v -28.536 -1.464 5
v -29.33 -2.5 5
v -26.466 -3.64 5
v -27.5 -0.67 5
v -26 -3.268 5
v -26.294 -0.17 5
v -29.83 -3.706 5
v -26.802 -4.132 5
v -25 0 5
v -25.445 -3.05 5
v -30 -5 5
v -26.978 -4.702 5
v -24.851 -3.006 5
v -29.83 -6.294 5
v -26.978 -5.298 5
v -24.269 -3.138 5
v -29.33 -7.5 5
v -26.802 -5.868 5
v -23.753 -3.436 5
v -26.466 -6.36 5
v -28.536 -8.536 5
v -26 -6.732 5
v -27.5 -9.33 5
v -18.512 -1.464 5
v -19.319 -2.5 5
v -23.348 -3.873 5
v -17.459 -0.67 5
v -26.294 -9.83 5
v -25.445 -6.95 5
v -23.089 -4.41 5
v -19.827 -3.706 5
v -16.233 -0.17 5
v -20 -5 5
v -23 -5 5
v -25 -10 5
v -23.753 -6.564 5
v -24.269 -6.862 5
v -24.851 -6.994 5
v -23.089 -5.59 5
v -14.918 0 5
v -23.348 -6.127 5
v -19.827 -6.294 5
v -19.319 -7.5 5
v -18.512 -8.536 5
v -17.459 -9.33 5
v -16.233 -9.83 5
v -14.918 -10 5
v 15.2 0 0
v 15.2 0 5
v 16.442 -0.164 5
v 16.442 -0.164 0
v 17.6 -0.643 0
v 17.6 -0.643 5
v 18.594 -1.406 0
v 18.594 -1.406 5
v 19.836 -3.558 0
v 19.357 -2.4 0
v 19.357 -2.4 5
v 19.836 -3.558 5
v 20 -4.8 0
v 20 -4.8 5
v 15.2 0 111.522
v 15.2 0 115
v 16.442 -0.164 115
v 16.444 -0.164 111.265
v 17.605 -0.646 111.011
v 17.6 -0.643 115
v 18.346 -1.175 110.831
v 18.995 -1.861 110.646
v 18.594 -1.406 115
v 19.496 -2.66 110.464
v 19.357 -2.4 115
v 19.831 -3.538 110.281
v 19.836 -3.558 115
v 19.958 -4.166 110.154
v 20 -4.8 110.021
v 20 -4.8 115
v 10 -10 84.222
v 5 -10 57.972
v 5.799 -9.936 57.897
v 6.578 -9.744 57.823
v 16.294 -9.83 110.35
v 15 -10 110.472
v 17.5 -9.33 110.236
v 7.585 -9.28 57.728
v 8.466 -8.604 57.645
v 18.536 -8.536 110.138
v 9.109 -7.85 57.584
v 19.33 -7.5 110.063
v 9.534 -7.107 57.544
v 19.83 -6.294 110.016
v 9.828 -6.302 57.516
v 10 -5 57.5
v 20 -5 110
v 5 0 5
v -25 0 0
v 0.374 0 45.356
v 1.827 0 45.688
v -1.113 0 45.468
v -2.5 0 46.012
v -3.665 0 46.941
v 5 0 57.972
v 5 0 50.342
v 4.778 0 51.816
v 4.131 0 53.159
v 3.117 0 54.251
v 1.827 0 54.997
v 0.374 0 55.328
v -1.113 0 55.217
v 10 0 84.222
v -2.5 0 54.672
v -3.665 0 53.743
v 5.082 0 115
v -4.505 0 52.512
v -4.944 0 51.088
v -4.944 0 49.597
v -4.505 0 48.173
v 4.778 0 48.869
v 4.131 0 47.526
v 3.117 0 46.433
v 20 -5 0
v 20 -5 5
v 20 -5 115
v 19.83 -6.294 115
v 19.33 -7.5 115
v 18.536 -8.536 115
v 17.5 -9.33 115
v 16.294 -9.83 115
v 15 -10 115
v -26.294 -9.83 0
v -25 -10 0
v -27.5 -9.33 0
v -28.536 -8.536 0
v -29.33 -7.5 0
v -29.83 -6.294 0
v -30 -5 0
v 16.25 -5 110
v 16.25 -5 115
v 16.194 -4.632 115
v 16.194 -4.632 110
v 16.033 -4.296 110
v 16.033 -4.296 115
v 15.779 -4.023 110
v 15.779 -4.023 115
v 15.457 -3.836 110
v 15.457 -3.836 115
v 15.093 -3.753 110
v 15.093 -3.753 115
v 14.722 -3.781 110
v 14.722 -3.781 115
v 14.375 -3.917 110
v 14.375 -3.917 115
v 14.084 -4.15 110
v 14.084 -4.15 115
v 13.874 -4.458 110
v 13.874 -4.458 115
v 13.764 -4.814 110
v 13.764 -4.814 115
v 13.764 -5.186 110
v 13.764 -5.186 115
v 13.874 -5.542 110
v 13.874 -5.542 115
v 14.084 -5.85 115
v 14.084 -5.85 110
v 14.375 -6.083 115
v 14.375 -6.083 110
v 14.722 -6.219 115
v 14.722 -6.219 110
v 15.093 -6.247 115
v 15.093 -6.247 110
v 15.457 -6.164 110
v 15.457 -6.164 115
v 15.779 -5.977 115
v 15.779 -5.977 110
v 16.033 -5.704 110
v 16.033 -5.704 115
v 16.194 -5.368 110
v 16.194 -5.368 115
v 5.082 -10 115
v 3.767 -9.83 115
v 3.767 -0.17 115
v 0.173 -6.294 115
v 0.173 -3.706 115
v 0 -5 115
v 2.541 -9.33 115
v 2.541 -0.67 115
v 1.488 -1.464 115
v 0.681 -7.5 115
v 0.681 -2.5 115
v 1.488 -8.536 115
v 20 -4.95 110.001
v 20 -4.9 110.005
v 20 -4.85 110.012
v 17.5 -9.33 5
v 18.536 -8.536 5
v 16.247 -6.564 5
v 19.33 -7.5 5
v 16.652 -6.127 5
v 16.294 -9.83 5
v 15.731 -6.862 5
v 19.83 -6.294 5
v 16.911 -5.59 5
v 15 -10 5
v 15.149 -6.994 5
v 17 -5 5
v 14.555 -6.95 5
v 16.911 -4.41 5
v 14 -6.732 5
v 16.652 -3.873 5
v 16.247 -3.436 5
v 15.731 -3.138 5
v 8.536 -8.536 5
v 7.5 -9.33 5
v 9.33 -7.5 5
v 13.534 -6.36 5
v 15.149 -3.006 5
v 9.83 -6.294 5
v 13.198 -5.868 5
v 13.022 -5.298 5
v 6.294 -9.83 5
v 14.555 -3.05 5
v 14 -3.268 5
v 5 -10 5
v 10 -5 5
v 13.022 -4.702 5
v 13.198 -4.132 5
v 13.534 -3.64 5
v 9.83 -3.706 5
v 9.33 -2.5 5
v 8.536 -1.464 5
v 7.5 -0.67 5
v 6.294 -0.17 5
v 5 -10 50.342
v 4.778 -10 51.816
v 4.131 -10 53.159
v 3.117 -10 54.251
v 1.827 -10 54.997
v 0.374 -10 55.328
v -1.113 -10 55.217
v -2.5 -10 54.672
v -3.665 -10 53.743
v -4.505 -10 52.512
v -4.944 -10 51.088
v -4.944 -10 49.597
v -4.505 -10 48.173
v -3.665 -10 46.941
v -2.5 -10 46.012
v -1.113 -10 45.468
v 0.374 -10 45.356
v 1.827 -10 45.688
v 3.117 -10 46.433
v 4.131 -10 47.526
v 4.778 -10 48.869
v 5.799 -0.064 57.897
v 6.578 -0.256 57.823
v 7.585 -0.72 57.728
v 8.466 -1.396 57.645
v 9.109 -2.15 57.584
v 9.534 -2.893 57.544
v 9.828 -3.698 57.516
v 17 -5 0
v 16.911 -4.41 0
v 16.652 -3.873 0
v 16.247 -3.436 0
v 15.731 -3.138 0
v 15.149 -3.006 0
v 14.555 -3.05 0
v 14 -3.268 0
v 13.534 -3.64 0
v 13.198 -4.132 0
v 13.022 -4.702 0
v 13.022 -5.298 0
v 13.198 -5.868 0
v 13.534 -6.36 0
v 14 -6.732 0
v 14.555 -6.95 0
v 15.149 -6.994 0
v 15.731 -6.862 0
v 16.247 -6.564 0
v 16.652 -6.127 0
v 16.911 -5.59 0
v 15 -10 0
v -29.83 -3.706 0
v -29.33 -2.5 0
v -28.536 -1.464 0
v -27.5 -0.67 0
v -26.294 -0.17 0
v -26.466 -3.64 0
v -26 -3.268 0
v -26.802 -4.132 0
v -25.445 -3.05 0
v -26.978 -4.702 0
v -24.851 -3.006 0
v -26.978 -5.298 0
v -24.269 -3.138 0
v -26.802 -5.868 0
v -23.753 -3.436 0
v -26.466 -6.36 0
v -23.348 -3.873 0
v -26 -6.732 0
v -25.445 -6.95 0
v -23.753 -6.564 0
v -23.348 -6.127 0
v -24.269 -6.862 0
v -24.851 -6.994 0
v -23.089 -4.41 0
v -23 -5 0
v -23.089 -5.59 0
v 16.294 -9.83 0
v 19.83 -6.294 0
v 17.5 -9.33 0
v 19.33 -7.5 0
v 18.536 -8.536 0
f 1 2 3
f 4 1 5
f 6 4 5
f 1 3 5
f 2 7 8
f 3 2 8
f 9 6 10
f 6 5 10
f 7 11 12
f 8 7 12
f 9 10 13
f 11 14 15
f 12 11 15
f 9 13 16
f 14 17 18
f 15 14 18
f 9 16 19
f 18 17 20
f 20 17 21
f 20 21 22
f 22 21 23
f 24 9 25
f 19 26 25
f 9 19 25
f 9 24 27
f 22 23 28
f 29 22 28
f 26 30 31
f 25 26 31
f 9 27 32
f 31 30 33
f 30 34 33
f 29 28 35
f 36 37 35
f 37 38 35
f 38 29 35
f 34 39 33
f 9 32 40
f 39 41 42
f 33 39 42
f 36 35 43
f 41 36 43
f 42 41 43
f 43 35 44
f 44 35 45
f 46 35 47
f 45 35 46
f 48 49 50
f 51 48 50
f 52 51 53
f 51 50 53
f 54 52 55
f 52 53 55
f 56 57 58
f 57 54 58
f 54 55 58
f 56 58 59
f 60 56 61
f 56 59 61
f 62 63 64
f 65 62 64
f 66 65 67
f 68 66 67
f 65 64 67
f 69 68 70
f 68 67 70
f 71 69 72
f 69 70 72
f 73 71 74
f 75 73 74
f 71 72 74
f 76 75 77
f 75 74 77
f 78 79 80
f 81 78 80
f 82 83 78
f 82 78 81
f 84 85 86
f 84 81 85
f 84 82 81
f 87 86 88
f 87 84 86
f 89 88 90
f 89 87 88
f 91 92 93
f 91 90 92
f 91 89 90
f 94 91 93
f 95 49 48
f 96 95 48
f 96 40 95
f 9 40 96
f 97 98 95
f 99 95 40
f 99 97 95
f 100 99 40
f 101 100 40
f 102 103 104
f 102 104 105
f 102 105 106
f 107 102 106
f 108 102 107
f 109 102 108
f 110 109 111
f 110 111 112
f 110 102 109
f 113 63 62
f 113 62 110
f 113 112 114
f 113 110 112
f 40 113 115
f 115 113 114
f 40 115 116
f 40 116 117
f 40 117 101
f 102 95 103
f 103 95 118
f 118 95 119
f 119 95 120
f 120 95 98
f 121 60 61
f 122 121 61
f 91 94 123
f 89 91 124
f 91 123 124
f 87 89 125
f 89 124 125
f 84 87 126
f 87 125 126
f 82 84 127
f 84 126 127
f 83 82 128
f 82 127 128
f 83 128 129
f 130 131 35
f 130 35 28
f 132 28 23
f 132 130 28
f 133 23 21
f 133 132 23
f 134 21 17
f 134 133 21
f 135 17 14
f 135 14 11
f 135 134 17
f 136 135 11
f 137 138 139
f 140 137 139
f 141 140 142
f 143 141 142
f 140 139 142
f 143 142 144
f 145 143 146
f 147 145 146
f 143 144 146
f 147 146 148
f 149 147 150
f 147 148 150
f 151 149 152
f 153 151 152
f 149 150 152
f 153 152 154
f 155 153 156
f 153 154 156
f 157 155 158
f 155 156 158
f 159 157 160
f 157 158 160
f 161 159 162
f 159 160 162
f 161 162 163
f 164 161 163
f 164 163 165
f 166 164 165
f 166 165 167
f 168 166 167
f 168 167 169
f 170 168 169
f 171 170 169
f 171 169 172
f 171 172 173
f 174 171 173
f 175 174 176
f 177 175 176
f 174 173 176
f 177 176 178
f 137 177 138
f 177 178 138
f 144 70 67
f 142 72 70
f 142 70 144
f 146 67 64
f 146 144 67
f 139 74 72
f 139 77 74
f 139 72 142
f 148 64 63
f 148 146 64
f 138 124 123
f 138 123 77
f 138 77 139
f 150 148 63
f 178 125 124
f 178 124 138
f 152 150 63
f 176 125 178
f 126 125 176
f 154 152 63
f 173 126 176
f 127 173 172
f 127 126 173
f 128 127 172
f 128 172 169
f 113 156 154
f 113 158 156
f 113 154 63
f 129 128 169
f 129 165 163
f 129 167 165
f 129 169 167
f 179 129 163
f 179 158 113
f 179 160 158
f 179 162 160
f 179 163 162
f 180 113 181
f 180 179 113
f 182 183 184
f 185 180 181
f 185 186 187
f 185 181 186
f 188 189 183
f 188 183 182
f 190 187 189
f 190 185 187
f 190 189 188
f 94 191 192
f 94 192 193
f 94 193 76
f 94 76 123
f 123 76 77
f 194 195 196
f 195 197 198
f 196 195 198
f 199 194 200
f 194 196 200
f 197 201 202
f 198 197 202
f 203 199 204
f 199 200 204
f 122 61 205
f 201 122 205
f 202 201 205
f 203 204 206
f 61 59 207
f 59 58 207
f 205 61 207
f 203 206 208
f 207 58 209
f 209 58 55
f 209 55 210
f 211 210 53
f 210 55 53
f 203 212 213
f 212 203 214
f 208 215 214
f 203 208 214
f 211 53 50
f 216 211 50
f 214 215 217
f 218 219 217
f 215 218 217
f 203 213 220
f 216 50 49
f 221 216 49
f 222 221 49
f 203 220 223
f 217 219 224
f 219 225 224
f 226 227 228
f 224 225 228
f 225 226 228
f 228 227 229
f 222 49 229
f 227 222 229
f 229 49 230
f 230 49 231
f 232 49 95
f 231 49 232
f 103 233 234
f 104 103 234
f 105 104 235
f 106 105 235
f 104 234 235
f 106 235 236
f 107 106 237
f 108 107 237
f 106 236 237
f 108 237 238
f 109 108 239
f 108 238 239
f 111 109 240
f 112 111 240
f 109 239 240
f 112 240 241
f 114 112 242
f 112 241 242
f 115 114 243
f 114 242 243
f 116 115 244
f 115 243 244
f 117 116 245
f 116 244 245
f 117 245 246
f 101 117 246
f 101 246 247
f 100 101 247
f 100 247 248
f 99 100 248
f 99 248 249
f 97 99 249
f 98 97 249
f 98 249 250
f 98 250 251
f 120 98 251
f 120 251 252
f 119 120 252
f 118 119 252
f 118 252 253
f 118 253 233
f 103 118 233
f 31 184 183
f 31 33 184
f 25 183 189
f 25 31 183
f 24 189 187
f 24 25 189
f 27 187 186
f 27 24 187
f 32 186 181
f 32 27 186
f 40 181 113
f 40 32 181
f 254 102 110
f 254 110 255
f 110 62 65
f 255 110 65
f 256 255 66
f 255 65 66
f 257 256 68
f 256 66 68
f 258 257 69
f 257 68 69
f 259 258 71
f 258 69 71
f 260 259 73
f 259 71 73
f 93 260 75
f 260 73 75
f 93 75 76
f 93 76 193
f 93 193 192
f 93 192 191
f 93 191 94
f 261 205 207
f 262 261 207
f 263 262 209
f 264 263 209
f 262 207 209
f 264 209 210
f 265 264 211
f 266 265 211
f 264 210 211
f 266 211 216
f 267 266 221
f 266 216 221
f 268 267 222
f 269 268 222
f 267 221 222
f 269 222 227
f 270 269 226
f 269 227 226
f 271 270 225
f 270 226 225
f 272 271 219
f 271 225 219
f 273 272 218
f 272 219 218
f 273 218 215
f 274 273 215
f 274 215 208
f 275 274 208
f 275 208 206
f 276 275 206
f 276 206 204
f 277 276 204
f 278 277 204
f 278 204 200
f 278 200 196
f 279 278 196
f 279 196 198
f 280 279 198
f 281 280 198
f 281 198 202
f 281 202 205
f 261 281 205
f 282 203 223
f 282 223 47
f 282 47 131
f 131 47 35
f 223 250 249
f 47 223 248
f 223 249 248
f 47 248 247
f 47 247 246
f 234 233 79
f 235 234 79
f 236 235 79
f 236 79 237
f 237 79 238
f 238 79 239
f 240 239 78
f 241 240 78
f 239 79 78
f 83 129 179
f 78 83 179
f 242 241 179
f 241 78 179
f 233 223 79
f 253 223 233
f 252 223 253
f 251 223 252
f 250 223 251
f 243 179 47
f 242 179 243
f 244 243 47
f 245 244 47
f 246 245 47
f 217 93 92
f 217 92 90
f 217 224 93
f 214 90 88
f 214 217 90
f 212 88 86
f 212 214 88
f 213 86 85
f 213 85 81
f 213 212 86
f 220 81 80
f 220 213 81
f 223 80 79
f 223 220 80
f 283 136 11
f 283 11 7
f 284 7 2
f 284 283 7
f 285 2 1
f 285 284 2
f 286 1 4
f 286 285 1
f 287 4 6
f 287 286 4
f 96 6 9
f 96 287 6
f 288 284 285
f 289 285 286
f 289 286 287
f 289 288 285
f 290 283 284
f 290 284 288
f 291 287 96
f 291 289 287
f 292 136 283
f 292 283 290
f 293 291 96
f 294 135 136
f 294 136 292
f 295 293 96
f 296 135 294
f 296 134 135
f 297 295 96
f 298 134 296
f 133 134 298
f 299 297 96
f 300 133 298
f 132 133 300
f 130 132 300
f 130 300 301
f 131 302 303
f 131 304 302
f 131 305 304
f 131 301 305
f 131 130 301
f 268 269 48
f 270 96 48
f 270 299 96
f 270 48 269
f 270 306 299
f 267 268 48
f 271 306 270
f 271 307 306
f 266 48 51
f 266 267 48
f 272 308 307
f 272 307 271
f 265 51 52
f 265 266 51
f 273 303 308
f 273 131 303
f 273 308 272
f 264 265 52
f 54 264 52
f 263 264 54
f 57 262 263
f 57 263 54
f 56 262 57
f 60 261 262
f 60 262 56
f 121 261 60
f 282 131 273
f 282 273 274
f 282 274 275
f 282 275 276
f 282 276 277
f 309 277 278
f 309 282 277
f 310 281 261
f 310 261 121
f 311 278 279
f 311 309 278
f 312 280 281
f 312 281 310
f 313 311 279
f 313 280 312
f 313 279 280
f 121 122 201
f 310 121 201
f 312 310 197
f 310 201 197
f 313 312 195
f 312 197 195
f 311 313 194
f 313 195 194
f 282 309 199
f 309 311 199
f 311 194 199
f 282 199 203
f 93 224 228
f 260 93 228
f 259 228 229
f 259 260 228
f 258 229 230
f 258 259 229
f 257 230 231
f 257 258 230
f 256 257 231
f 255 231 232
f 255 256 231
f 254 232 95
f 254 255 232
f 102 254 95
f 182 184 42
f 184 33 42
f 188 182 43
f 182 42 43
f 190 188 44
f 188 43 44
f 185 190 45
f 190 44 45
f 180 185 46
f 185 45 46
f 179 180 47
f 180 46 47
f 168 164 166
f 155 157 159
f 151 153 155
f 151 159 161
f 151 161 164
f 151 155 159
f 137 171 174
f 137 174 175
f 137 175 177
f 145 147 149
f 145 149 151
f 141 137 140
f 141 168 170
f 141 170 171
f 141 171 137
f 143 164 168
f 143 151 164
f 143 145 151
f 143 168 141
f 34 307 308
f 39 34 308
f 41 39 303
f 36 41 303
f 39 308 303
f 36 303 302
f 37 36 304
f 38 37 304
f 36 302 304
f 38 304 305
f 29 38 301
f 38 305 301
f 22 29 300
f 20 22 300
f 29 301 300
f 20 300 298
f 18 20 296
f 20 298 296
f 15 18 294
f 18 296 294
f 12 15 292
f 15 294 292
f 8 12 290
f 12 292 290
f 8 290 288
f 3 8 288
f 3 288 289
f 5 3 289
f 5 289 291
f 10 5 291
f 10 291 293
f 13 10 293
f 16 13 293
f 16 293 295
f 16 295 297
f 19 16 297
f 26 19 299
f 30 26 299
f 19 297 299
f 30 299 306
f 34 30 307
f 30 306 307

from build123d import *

# Parameters (mm, degrees)
F1_DEPTH     = 10
F2_R         = 2
F3_DEPTH     = 115.001
F4_R         = 2
F4_R_2       = 1.25
F5_DEPTH     = 5
F6_R         = 2
F7_DEPTH     = 5
F9_DEPTH     = 10
F10_R        = 4.99999
F11_R        = 5
F12_DEPTH    = 10.001
F14_DEPTH    = 10
F15_T4_DEPTH = 78.4438958161
F15_T9_DEPTH = 78.4438958161
F16_R        = 4.99999


# Not quite as in the source:
# - a fillet or chamfer that OpenCascade refuses, or shapes differently, is made with other operations: its cross-section is extruded or revolved along the edge and cut away or added
# - a fillet or chamfer is up to 0.001 mm smaller than in the source, because OpenCascade refuses the exact size


with BuildPart() as f1:
    # F0 (on Front) → F1 (new body)
    with BuildSketch(Plane.XZ):
        Polygon((0, 115), (0, 0), (10, 0), (20, 0), (20, 5), (10, 5), (10, 110), (20, 110), (20, 115), (10, 115), align=None)
    extrude(amount=F1_DEPTH)

    # F2 (on face) → F3 (cut, through all)
    with BuildSketch(Plane.XY.offset(115)):
        with BuildLine():
            Line((0, -10), (5, -10))
            ThreePointArc((5, -10), (1.4644660941, -8.5355339059), (0, -5))
            Line((0, -5), (0, -10))
        make_face()
        with BuildLine():
            Line((0, 0), (0, -5))
            ThreePointArc((0, -5), (1.4644660941, -1.4644660941), (5, 0))
            Line((5, 0), (0, 0))
        make_face()
        with BuildLine():
            ThreePointArc((15.2, 0), (18.5941125497, -1.4058874503), (20, -4.8))
            Line((20, -4.8), (20, 0))
            Line((20, 0), (15.2, 0))
        make_face()
        with BuildLine():
            ThreePointArc((20, -5), (18.5355339059, -8.5355339059), (15, -10))
            Line((15, -10), (20, -10))
            Line((20, -10), (20, -5))
        make_face()
        with Locations((15, -5)):
            Circle(F2_R)
    extrude(amount=-F3_DEPTH, mode=Mode.SUBTRACT)

    # F4 (on face) → F5 (join)
    with BuildSketch(Plane.XY.offset(115)):
        with Locations((15, -5)):
            Circle(F4_R)
        with Locations((15, -5)):
            Circle(F4_R_2, mode=Mode.SUBTRACT)
    extrude(amount=-F5_DEPTH)

    # F6 (on face) → F7 (join)
    with BuildSketch(Plane(origin=(0, 0, 0), x_dir=(1, 0, 0), z_dir=(0, 0, -1))):
        with BuildLine():
            Line((-25, 0), (5, 0))
            ThreePointArc((5, 0), (0, 5), (5, 10))
            Line((5, 10), (-25, 10))
            ThreePointArc((-25, 10), (-28.5355339059, 8.5355339059), (-30, 5))
            ThreePointArc((-30, 5), (-28.5355339059, 1.4644660941), (-25, 0))
        make_face()
        with Locations((-25, 5)):
            Circle(F6_R, mode=Mode.SUBTRACT)
    extrude(amount=-F7_DEPTH)

    # F8 (on face) → F9 (join)
    with BuildSketch(Plane.XZ.offset(10)):
        Polygon((0, 115), (-20, 5), (5, 5), (5, 115), align=None)
    extrude(amount=-F9_DEPTH)

    # F10 (radius 5 in the source; OpenCascade refuses exactly that, so slightly less here)
    f10_edges = [f1.edges().sort_by_distance(p)[0] for p in [
        (-10, 0, 60),
        (-10, -10, 60),
    ]]
    fillet(f10_edges, radius=F10_R)

    # F11 (on face) → F12 (cut, through all)
    with BuildSketch(Plane.XZ.offset(10)):
        with Locations((0, 50.3422953188)):
            Circle(F11_R)
    extrude(amount=-F12_DEPTH, mode=Mode.SUBTRACT)

    # F13 (on face) → F14 (join)
    with BuildSketch(Plane(origin=(0, 0, 0), x_dir=(-1, 0, 0), z_dir=(0, 1, 0))):
        Polygon((-20, 110), (-10, 57.5), (-10, 110), (-15.2, 110), align=None)
    extrude(amount=-F14_DEPTH)

    # F15: fillet of radius 5 on 2 edges, made by hand


with BuildPart() as f15_tool2:
    # F15_s3 → F15_t4 (new body)
    with BuildSketch(Plane(origin=(23.2579385477, 0, 122.1041773757), x_dir=(0, 1, 0), z_dir=(-0.1871121079, 0, -0.9823385664))):
        with BuildLine():
            ThreePointArc((0, -5.9355605394), (-1.4644660941, -2.4000266335), (-5, -0.9355605394))
            Line((-5, -0.9355605394), (0, -0.9355605394))
            Line((0, -0.9355605394), (0, -5.9355605394))
        make_face()
    extrude(amount=F15_T4_DEPTH)

    split(bisect_by=Plane.YZ.offset(10), keep=Keep.TOP)


with BuildPart() as f1_1:
    add(f1.part)

    # F15_t1: cut F15_tool2
    add(f15_tool2.part, mode=Mode.SUBTRACT)


with BuildPart() as f15_tool7:
    # F15_s8 → F15_t9 (new body)
    with BuildSketch(Plane(origin=(23.2579385477, 0, 122.1041773757), x_dir=(0, 1, 0), z_dir=(-0.1871121079, 0, -0.9823385664))):
        with BuildLine():
            ThreePointArc((-10, -5.9355605394), (-8.5355339059, -2.4000266335), (-5, -0.9355605394))
            Line((-5, -0.9355605394), (-10, -0.9355605394))
            Line((-10, -0.9355605394), (-10, -5.9355605394))
        make_face()
    extrude(amount=F15_T9_DEPTH)

    split(bisect_by=Plane.YZ.offset(10), keep=Keep.TOP)


with BuildPart() as f1_2:
    add(f1_1.part)

    # F15_t6: cut F15_tool7
    add(f15_tool7.part, mode=Mode.SUBTRACT)

    # F16 (radius 5 in the source; OpenCascade refuses exactly that, so slightly less here)
    f16_edges = [f1_2.edges().sort_by_distance(p)[0] for p in [
        (10, 0, 44.610974),
        (10, -10, 44.610974),
    ]]
    fillet(f16_edges, radius=F16_R)


solid = f1_2.part
